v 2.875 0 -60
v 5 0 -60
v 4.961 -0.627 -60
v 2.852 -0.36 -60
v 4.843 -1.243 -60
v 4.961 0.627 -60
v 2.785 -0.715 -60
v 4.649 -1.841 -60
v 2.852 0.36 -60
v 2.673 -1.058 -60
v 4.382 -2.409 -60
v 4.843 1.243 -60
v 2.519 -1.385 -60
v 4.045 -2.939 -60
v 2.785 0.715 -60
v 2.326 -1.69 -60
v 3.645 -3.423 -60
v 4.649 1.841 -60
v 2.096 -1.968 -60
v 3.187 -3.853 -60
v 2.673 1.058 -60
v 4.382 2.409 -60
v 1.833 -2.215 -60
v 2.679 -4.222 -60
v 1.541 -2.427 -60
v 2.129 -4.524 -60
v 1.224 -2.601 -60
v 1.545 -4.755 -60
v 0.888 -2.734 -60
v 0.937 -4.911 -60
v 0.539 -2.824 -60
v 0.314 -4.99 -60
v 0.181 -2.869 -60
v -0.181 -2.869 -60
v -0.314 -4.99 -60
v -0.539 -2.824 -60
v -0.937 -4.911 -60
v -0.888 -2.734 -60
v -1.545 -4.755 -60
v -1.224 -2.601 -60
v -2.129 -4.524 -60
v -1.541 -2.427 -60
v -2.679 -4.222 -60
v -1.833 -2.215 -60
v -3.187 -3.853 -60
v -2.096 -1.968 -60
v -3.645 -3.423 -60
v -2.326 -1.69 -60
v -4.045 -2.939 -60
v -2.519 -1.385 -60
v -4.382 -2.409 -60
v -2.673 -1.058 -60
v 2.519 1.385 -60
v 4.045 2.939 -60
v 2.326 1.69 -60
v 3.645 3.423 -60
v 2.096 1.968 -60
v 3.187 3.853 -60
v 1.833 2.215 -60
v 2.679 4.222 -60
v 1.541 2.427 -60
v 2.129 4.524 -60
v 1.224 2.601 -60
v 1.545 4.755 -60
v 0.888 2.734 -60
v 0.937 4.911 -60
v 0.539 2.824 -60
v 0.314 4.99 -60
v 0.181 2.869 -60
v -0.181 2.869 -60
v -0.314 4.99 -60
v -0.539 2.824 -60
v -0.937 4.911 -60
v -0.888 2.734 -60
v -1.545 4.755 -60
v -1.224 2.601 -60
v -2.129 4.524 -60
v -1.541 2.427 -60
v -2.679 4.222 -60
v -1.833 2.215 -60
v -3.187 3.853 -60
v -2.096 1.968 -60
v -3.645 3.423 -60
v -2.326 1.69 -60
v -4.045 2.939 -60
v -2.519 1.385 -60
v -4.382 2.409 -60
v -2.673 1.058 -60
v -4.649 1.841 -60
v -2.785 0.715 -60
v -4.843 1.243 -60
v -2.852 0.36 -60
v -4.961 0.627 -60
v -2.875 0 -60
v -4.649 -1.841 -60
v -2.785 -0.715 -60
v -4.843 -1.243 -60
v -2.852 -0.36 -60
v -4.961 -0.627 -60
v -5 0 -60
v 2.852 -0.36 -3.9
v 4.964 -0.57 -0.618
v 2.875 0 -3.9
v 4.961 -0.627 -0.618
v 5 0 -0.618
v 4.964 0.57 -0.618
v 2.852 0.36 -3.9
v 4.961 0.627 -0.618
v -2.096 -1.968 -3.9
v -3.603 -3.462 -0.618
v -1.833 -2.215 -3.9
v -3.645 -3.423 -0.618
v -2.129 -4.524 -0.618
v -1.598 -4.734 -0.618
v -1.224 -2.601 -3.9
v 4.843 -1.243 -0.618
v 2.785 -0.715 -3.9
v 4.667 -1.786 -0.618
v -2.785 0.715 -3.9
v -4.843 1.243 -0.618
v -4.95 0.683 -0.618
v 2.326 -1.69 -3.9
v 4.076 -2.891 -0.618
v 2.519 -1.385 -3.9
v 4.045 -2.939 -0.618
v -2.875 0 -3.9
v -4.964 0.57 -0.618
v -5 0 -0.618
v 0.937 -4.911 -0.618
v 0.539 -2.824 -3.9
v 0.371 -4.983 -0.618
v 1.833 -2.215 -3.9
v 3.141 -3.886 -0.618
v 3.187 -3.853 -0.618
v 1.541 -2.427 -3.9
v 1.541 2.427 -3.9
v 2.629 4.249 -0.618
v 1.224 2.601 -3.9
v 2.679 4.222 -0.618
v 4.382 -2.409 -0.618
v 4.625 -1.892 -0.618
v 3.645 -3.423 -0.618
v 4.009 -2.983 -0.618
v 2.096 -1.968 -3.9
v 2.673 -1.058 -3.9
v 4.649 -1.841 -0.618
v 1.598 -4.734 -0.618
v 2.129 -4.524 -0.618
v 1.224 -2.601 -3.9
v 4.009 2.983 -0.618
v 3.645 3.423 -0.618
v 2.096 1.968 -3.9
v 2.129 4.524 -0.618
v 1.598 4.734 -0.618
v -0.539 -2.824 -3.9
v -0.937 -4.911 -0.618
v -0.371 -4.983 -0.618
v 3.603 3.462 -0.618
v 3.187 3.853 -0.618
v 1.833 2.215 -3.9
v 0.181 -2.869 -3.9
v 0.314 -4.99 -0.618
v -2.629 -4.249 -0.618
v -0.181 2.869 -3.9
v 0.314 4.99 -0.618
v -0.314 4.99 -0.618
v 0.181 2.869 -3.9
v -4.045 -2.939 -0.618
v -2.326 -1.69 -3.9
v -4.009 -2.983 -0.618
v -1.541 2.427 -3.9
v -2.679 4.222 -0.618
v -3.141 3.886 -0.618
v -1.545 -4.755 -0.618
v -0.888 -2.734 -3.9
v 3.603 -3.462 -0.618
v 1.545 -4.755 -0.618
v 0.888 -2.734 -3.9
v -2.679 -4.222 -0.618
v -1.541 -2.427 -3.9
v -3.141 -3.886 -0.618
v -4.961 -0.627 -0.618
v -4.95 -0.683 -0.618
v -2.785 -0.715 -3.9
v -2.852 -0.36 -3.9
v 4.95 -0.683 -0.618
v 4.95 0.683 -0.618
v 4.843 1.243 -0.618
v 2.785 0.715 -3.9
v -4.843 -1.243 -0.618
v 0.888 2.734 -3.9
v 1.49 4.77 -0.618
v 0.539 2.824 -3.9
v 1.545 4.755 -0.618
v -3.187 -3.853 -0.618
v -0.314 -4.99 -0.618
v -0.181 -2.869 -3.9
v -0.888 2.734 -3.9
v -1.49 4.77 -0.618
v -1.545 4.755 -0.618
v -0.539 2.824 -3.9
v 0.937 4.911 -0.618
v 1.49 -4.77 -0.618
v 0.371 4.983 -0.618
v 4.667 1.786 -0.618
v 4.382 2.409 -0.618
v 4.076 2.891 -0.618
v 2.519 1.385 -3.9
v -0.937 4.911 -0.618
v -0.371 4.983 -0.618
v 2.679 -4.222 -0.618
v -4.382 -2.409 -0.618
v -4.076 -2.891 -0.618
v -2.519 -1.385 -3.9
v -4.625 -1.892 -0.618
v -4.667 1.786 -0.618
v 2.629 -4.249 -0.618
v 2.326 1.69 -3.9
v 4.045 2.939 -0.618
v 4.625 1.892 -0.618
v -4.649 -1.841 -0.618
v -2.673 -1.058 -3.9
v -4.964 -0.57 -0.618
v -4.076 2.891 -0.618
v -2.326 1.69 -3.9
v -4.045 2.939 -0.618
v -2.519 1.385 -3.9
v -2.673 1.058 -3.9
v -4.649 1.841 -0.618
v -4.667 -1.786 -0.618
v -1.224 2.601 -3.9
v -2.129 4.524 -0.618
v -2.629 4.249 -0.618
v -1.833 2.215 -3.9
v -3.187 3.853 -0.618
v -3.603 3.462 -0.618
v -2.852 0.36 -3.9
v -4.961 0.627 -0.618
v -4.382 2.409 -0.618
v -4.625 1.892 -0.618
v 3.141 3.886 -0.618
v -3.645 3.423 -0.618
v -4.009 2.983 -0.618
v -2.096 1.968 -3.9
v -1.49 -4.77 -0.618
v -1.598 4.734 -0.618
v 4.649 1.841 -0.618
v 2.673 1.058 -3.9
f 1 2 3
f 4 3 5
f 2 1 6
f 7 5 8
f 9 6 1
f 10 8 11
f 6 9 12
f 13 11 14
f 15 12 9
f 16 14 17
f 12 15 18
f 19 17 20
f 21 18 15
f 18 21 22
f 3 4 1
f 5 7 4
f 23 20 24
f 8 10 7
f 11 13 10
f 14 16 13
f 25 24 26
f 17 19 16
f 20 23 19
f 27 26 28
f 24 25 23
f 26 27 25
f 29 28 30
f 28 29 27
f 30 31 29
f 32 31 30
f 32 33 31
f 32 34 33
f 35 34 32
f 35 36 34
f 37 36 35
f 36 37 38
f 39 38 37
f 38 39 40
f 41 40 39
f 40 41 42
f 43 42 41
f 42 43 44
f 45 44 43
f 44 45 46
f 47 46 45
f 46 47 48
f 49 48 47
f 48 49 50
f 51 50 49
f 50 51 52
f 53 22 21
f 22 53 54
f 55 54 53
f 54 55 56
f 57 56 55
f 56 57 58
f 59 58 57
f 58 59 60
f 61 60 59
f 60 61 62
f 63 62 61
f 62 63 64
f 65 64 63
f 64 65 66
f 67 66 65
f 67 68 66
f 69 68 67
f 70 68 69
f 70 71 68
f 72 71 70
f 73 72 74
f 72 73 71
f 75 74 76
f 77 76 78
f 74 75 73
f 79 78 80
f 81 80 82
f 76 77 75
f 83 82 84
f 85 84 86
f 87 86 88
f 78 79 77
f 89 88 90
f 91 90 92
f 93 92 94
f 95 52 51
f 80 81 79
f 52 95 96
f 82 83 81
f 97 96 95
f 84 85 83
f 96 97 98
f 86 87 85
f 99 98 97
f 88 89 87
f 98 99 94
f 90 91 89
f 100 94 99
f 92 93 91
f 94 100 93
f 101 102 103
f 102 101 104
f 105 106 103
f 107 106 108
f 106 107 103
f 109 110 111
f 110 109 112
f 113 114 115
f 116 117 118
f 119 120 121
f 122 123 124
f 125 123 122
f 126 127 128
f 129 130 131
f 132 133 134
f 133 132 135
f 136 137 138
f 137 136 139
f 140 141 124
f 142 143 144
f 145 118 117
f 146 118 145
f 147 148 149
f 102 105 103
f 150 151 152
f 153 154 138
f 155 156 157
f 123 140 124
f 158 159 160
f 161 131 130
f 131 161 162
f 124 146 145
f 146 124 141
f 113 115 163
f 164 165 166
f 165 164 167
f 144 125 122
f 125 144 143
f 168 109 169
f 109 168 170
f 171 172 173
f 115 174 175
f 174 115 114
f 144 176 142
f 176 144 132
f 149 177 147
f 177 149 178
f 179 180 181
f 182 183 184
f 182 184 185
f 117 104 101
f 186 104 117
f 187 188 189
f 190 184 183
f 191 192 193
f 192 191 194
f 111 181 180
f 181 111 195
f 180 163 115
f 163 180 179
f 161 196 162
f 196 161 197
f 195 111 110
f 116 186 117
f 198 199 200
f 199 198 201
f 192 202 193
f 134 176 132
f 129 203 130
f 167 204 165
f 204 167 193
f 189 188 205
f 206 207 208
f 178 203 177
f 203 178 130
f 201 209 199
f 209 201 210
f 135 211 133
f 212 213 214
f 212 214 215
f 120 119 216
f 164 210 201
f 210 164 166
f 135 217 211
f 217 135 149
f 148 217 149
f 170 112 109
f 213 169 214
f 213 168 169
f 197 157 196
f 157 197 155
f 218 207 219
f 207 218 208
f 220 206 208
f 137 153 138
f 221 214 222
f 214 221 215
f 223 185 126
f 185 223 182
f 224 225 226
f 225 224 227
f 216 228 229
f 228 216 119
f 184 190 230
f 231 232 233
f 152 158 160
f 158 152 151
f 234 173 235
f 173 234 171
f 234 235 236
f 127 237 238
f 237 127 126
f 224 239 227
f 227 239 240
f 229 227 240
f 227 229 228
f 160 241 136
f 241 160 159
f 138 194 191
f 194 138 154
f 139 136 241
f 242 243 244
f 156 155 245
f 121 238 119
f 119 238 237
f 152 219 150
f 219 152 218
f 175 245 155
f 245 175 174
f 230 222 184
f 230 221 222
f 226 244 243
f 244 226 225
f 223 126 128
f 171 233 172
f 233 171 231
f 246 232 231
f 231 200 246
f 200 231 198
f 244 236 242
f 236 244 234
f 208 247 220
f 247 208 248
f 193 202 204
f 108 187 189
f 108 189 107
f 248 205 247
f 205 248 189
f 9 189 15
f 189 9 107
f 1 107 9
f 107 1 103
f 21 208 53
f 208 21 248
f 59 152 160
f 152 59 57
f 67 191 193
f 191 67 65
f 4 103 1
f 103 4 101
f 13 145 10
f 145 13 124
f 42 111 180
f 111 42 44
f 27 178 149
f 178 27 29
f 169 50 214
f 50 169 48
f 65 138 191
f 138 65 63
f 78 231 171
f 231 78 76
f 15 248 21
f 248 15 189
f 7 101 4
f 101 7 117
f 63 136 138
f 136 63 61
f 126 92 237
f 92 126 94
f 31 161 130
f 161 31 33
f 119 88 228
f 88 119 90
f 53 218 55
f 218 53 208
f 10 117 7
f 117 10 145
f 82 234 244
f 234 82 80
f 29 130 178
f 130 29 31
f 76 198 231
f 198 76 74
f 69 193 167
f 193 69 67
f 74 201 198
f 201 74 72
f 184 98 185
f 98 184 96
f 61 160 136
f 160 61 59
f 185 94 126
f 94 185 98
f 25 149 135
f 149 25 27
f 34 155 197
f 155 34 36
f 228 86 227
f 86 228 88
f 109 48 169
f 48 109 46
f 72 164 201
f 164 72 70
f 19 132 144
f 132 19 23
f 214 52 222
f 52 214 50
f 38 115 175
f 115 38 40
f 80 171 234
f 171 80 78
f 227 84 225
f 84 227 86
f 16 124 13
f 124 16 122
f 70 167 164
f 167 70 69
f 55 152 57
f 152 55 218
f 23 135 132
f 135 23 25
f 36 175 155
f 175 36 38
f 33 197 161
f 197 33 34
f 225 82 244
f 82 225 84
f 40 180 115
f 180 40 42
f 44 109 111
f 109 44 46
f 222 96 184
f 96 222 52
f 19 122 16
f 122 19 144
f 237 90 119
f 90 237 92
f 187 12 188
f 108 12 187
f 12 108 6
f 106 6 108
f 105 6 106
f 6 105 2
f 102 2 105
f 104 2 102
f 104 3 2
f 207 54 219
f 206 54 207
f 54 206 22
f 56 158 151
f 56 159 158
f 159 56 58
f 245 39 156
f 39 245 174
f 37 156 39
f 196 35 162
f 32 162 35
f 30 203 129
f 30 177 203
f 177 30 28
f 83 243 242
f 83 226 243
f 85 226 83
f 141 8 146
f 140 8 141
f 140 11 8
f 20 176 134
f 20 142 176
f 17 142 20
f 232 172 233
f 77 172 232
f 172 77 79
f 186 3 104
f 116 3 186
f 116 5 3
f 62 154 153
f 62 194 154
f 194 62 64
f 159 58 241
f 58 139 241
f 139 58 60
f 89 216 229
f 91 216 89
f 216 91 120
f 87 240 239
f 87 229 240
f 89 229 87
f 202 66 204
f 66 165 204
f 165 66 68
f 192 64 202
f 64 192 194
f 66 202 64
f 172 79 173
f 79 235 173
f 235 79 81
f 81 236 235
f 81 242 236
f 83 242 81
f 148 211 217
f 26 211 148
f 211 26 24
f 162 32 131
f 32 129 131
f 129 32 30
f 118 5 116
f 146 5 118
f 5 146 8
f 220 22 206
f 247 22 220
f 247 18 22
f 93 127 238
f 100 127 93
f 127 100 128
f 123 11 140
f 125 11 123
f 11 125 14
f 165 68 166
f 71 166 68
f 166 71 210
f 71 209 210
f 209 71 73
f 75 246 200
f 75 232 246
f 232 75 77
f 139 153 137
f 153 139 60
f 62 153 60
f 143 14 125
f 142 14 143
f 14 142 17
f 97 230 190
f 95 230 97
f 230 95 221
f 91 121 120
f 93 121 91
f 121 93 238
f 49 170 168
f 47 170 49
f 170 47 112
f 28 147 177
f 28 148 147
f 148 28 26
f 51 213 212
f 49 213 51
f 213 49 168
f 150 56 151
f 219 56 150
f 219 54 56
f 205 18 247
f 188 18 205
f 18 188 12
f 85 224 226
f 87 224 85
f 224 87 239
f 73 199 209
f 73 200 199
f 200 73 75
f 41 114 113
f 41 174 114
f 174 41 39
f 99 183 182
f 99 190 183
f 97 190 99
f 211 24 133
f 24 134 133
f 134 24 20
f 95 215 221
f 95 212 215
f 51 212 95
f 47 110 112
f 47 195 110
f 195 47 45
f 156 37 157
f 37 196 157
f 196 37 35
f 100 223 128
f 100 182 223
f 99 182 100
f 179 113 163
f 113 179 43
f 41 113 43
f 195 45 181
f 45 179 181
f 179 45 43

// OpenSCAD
$fn = 50;


difference() {
	union() {
		translate(v = [0, 0, -60.0000000000]) {
			cylinder(h = 60, r = 5.0000000000);
		}
		cylinder(h = 0, r = 8.0000000000);
	}
	union() {
		translate(v = [0, 0, 0]) {
			rotate(a = [0, 0, 0]) {
				difference() {
					union() {
						#translate(v = [0, 0, -60.0000000000]) {
							cylinder(h = 60, r = 2.6000000000);
						}
						#translate(v = [0, 0, -3.9000000000]) {
							cylinder(h = 3.9000000000, r = 5.0000000000, r1 = 2.8750000000, r2 = 5.4000000000);
						}
						#translate(v = [0, 0, -60.0000000000]) {
							cylinder(h = 60, r = 2.8750000000);
						}
						#translate(v = [0, 0, -60.0000000000]) {
							cylinder(h = 60, r = 2.6000000000);
						}
					}
					union();
				}
			}
		}
	}
}
